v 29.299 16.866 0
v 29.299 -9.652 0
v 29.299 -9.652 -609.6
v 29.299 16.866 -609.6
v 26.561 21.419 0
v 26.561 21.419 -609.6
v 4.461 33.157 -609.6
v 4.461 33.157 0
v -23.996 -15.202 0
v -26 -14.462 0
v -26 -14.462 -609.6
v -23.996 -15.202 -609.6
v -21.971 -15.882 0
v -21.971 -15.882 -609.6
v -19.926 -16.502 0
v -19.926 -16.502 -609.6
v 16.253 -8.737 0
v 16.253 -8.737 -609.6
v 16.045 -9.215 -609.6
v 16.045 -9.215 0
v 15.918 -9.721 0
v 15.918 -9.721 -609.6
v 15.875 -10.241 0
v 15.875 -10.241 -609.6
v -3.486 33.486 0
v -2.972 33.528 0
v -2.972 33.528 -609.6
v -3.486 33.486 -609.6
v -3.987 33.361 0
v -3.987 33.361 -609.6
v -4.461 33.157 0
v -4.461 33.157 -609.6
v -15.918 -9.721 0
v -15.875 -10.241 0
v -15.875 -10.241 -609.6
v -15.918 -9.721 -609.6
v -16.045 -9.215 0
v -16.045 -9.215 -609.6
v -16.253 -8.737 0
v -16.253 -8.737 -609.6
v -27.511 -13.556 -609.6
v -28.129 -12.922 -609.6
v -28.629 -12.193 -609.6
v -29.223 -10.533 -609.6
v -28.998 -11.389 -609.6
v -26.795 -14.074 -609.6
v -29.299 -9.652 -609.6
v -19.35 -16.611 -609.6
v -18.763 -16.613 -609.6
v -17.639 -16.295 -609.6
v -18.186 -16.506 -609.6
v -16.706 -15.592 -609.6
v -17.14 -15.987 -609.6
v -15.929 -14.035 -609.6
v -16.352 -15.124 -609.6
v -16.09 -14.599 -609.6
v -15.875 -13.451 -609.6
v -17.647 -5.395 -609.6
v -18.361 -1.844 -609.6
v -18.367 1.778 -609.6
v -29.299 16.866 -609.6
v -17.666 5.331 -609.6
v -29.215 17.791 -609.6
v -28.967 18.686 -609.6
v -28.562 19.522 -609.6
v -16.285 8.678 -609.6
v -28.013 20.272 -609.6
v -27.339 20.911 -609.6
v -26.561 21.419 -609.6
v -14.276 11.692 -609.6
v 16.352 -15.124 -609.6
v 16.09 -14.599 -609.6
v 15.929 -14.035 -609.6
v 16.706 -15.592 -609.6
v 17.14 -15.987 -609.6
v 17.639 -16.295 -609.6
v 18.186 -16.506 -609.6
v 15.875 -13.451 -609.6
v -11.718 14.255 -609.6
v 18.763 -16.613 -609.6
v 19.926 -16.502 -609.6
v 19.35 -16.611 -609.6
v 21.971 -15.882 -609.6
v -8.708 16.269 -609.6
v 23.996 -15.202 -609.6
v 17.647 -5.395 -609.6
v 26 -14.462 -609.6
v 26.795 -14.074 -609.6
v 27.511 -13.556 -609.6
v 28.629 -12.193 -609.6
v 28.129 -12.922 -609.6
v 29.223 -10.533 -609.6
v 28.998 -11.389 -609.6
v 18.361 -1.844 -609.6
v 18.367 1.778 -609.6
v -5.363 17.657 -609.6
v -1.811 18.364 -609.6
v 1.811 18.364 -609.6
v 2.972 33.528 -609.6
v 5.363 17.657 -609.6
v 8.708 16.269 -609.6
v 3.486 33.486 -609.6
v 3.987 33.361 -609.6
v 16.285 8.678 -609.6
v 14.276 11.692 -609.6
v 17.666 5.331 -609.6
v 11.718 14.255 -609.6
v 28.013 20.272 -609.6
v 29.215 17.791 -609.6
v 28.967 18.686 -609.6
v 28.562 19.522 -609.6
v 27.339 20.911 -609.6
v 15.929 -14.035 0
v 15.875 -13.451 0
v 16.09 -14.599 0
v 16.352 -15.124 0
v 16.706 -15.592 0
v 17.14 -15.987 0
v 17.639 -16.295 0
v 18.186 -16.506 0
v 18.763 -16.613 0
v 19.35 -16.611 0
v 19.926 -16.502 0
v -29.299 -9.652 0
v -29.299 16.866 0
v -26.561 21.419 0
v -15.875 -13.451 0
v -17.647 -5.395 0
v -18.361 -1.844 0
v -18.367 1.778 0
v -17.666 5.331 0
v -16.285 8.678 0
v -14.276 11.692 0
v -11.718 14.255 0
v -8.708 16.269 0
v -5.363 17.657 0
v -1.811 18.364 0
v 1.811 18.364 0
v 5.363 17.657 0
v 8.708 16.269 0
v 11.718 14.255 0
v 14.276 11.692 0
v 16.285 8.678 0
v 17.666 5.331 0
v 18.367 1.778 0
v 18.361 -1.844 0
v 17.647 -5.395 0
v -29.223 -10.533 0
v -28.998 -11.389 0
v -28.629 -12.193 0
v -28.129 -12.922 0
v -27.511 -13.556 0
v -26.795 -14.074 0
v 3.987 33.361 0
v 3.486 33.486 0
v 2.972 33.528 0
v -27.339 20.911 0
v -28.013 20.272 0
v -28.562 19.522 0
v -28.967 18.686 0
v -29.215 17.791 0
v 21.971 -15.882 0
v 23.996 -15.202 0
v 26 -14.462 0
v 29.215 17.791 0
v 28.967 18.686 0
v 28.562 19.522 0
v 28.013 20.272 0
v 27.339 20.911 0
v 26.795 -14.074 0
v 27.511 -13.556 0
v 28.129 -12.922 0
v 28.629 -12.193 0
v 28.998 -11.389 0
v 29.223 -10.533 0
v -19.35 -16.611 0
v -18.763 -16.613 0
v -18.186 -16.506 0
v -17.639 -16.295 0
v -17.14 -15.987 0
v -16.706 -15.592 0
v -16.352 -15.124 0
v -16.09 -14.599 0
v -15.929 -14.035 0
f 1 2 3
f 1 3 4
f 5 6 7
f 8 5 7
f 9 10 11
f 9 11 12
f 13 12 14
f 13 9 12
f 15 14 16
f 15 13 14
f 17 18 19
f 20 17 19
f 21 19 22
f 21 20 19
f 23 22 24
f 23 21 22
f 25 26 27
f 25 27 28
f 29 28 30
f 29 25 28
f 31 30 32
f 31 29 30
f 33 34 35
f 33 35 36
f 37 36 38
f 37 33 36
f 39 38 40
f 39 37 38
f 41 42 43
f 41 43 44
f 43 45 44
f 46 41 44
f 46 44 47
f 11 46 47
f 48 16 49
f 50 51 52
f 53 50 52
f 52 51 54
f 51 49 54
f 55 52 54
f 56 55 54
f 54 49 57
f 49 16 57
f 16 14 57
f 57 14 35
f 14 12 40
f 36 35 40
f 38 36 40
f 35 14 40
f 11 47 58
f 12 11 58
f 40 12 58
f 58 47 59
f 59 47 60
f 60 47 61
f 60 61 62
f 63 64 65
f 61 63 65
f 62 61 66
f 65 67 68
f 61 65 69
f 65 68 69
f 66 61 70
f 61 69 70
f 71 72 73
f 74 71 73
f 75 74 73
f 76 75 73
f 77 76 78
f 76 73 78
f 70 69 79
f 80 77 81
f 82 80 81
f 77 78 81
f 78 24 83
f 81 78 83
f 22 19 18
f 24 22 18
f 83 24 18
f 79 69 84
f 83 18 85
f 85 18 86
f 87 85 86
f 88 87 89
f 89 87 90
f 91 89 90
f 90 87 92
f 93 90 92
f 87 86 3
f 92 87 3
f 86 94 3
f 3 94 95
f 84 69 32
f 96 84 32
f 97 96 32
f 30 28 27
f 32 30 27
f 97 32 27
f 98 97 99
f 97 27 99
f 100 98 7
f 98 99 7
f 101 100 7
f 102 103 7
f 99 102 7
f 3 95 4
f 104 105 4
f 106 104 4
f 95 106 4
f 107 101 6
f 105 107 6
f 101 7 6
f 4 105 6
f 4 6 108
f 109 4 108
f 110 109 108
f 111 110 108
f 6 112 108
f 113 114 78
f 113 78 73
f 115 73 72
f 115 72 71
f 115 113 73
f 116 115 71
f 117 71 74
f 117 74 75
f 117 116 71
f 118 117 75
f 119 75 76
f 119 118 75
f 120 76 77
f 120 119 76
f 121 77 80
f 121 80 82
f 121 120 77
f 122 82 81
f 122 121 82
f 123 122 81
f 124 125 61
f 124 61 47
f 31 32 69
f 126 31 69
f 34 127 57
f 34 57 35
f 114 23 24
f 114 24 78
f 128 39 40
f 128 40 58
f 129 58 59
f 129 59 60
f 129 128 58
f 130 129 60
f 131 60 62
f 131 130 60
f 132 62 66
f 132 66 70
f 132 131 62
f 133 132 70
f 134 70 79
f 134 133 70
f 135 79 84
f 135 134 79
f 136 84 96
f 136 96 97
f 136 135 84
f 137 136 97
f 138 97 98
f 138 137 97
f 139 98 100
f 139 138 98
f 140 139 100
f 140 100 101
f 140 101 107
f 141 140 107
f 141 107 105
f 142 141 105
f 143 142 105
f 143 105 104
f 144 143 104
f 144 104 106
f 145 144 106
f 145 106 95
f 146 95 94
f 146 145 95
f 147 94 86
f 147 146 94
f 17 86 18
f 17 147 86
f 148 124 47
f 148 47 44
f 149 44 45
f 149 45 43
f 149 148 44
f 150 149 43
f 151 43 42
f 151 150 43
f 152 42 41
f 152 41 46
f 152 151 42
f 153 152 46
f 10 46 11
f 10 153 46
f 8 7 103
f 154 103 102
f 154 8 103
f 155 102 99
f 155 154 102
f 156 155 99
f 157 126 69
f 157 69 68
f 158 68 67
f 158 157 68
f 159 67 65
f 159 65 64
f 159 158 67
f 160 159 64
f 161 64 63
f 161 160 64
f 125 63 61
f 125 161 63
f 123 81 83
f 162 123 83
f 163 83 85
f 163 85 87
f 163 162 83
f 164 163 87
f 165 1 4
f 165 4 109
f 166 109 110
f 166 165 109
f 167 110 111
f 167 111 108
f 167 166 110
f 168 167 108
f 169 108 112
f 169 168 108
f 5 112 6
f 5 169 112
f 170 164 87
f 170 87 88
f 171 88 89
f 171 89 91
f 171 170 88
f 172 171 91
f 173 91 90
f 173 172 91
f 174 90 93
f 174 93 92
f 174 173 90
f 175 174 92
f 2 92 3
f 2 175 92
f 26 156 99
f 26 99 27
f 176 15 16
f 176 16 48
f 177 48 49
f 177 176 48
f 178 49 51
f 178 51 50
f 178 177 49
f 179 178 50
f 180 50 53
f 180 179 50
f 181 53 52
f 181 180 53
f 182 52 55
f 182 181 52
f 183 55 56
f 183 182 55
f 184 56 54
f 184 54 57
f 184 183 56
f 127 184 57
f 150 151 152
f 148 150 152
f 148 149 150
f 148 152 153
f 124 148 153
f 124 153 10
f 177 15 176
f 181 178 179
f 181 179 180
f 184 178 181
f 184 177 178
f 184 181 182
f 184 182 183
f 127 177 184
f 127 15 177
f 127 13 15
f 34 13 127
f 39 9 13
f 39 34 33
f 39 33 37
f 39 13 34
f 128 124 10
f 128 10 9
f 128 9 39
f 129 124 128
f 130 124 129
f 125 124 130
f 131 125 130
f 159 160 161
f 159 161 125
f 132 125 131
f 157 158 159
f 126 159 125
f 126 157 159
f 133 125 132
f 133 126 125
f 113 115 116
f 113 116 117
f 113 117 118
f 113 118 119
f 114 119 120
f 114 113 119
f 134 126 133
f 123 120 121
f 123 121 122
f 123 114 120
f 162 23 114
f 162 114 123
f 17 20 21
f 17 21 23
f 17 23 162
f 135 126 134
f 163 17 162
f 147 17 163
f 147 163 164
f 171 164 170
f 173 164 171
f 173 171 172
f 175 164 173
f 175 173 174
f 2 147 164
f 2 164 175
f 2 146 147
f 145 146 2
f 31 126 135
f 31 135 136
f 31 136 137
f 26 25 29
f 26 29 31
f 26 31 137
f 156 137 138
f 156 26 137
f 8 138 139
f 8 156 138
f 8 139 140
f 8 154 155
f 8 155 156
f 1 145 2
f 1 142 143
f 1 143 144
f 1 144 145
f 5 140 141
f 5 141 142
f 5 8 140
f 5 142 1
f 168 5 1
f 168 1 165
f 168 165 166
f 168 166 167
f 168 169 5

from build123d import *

# Parameters (mm, degrees)
EXTRUDE1_DEPTH = 609.6


with BuildPart() as part:
    # Sketch1 → Extrude1 (new body)
    with BuildSketch(Plane.XY):
        with BuildLine():
            Line((2.9718, 33.528), (-2.9718, 33.528))
            ThreePointArc((-2.9718, 33.528), (-3.739183777, 33.43386792), (-4.46106492, 33.157053316))
            Line((-4.46106492, 33.157053316), (-26.56126623, 21.419382585))
            ThreePointArc((-26.56126623, 21.419382585), (-28.56180679, 19.522269649), (-29.2989, 16.8656))
            Line((-29.2989, 16.8656), (-29.2989, -9.652))
            ThreePointArc((-29.2989, -9.652), (-28.394883916, -12.568389957), (-25.999830769, -14.462141759))
            ThreePointArc((-25.999830769, -14.462141759), (-22.985772925, -15.549597701), (-19.926426205, -16.502227094))
            ThreePointArc((-19.926426205, -16.502227094), (-17.139768103, -15.98665549), (-15.875, -13.450587845))
            Line((-15.875, -13.450587845), (-15.875, -10.240713335))
            ThreePointArc((-15.875, -10.240713335), (-15.971069561, -9.465592471), (-16.253464474, -8.737379023))
            ThreePointArc((-16.253464474, -8.737379023), (0, 18.4531), (16.253464474, -8.737379023))
            ThreePointArc((16.253464474, -8.737379023), (15.971069561, -9.465592471), (15.875, -10.240713335))
            Line((15.875, -10.240713335), (15.875, -13.450587845))
            ThreePointArc((15.875, -13.450587845), (17.139768103, -15.98665549), (19.926426205, -16.502227094))
            ThreePointArc((19.926426205, -16.502227094), (22.985772925, -15.549597701), (25.999830769, -14.462141759))
            ThreePointArc((25.999830769, -14.462141759), (28.394883916, -12.568389957), (29.2989, -9.652))
            Line((29.2989, -9.652), (29.2989, 16.8656))
            ThreePointArc((29.2989, 16.8656), (28.56180679, 19.522269649), (26.56126623, 21.419382585))
            Line((26.56126623, 21.419382585), (4.46106492, 33.157053316))
            ThreePointArc((4.46106492, 33.157053316), (3.739183777, 33.43386792), (2.9718, 33.528))
        make_face()
    extrude(amount=-EXTRUDE1_DEPTH)


solid = part.part
